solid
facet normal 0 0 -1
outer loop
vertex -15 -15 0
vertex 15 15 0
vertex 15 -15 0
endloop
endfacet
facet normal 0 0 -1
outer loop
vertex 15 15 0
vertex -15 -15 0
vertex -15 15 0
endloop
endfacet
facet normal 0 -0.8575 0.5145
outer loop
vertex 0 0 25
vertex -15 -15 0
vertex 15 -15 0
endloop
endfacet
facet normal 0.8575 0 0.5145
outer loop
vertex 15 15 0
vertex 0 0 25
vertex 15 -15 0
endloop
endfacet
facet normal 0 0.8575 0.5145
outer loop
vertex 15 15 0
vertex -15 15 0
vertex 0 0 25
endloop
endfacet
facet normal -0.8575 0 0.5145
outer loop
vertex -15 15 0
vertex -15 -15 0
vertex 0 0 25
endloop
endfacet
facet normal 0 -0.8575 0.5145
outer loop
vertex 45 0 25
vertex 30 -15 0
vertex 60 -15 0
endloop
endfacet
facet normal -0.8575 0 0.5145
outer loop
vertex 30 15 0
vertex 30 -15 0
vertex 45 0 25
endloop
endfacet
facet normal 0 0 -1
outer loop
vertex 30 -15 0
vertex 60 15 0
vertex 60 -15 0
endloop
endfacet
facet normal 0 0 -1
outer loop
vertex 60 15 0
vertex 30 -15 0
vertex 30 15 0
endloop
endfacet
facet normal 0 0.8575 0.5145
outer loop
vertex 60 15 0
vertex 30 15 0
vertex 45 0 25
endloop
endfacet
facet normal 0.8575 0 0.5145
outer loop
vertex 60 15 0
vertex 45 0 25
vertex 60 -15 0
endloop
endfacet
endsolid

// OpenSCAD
// polyhedron(): every face spelled out by hand.
//
// Faces are listed clockwise seen from OUTSIDE the solid. Get one
// backwards and the mesh is inside out; leave a gap and it is not a
// solid at all. Faces may have more than three points, and need not be
// convex -- they are triangulated for you.

points = [
    [-15, -15, 0], [15, -15, 0], [15, 15, 0], [-15, 15, 0],   // base
    [0, 0, 25],                                                // apex
];

faces = [
    [0, 3, 2, 1],      // the base, one four-sided face
    [0, 1, 4],
    [1, 2, 4],
    [2, 3, 4],
    [3, 0, 4],
];

polyhedron(points=points, faces=faces);

// The same shape built from a VNF-style list, offset alongside.
translate([45, 0, 0])
    linear_extrude(height=25, scale=0)
        square(30, center=true);
